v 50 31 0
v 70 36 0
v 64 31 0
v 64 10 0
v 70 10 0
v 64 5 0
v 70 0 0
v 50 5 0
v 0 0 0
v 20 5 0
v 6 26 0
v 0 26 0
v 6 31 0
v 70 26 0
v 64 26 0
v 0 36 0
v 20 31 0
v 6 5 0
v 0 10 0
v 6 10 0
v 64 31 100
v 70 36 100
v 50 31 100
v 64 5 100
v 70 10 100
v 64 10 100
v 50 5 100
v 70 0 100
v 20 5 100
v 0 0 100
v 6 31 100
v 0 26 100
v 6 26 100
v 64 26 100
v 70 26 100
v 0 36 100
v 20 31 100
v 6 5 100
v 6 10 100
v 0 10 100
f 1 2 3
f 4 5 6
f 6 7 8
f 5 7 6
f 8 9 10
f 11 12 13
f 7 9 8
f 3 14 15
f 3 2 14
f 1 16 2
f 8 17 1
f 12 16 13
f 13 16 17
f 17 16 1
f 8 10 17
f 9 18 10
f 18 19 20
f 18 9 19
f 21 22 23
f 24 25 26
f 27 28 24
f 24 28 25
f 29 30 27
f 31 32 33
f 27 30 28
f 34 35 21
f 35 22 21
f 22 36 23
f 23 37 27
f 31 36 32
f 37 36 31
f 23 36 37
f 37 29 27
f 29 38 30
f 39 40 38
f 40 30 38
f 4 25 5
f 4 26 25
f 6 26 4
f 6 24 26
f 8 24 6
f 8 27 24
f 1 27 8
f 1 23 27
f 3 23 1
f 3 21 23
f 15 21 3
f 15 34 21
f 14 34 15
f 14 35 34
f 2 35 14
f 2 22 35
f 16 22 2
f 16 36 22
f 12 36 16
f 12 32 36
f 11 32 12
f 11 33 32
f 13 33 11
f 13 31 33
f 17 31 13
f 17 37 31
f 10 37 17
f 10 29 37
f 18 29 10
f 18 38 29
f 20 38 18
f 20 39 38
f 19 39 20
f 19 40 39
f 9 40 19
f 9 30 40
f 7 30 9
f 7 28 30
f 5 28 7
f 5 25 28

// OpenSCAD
$fn = 32;

// ----------------------------------------------------------------------
// T-slot rail: 70 x 36 mm section, 100 mm long
// ----------------------------------------------------------------------

// --- parameters (mm) ---
profile_height = 100;     // extrusion height
profile_points = 20;      // points of the closed outline

profile = [[0, 0], [70, 0], [70, 10], [64, 10], [64, 5], [50, 5], [50, 31], [64, 31], [64, 26], [70, 26], [70, 36], [0, 36], [0, 26], [6, 26], [6, 31], [20, 31], [20, 5], [6, 5], [6, 10], [0, 10]];  // single closed polygon, 20 points, counter clockwise

// --- the one profile operation ---
linear_extrude(height = profile_height) polygon(points = profile);
